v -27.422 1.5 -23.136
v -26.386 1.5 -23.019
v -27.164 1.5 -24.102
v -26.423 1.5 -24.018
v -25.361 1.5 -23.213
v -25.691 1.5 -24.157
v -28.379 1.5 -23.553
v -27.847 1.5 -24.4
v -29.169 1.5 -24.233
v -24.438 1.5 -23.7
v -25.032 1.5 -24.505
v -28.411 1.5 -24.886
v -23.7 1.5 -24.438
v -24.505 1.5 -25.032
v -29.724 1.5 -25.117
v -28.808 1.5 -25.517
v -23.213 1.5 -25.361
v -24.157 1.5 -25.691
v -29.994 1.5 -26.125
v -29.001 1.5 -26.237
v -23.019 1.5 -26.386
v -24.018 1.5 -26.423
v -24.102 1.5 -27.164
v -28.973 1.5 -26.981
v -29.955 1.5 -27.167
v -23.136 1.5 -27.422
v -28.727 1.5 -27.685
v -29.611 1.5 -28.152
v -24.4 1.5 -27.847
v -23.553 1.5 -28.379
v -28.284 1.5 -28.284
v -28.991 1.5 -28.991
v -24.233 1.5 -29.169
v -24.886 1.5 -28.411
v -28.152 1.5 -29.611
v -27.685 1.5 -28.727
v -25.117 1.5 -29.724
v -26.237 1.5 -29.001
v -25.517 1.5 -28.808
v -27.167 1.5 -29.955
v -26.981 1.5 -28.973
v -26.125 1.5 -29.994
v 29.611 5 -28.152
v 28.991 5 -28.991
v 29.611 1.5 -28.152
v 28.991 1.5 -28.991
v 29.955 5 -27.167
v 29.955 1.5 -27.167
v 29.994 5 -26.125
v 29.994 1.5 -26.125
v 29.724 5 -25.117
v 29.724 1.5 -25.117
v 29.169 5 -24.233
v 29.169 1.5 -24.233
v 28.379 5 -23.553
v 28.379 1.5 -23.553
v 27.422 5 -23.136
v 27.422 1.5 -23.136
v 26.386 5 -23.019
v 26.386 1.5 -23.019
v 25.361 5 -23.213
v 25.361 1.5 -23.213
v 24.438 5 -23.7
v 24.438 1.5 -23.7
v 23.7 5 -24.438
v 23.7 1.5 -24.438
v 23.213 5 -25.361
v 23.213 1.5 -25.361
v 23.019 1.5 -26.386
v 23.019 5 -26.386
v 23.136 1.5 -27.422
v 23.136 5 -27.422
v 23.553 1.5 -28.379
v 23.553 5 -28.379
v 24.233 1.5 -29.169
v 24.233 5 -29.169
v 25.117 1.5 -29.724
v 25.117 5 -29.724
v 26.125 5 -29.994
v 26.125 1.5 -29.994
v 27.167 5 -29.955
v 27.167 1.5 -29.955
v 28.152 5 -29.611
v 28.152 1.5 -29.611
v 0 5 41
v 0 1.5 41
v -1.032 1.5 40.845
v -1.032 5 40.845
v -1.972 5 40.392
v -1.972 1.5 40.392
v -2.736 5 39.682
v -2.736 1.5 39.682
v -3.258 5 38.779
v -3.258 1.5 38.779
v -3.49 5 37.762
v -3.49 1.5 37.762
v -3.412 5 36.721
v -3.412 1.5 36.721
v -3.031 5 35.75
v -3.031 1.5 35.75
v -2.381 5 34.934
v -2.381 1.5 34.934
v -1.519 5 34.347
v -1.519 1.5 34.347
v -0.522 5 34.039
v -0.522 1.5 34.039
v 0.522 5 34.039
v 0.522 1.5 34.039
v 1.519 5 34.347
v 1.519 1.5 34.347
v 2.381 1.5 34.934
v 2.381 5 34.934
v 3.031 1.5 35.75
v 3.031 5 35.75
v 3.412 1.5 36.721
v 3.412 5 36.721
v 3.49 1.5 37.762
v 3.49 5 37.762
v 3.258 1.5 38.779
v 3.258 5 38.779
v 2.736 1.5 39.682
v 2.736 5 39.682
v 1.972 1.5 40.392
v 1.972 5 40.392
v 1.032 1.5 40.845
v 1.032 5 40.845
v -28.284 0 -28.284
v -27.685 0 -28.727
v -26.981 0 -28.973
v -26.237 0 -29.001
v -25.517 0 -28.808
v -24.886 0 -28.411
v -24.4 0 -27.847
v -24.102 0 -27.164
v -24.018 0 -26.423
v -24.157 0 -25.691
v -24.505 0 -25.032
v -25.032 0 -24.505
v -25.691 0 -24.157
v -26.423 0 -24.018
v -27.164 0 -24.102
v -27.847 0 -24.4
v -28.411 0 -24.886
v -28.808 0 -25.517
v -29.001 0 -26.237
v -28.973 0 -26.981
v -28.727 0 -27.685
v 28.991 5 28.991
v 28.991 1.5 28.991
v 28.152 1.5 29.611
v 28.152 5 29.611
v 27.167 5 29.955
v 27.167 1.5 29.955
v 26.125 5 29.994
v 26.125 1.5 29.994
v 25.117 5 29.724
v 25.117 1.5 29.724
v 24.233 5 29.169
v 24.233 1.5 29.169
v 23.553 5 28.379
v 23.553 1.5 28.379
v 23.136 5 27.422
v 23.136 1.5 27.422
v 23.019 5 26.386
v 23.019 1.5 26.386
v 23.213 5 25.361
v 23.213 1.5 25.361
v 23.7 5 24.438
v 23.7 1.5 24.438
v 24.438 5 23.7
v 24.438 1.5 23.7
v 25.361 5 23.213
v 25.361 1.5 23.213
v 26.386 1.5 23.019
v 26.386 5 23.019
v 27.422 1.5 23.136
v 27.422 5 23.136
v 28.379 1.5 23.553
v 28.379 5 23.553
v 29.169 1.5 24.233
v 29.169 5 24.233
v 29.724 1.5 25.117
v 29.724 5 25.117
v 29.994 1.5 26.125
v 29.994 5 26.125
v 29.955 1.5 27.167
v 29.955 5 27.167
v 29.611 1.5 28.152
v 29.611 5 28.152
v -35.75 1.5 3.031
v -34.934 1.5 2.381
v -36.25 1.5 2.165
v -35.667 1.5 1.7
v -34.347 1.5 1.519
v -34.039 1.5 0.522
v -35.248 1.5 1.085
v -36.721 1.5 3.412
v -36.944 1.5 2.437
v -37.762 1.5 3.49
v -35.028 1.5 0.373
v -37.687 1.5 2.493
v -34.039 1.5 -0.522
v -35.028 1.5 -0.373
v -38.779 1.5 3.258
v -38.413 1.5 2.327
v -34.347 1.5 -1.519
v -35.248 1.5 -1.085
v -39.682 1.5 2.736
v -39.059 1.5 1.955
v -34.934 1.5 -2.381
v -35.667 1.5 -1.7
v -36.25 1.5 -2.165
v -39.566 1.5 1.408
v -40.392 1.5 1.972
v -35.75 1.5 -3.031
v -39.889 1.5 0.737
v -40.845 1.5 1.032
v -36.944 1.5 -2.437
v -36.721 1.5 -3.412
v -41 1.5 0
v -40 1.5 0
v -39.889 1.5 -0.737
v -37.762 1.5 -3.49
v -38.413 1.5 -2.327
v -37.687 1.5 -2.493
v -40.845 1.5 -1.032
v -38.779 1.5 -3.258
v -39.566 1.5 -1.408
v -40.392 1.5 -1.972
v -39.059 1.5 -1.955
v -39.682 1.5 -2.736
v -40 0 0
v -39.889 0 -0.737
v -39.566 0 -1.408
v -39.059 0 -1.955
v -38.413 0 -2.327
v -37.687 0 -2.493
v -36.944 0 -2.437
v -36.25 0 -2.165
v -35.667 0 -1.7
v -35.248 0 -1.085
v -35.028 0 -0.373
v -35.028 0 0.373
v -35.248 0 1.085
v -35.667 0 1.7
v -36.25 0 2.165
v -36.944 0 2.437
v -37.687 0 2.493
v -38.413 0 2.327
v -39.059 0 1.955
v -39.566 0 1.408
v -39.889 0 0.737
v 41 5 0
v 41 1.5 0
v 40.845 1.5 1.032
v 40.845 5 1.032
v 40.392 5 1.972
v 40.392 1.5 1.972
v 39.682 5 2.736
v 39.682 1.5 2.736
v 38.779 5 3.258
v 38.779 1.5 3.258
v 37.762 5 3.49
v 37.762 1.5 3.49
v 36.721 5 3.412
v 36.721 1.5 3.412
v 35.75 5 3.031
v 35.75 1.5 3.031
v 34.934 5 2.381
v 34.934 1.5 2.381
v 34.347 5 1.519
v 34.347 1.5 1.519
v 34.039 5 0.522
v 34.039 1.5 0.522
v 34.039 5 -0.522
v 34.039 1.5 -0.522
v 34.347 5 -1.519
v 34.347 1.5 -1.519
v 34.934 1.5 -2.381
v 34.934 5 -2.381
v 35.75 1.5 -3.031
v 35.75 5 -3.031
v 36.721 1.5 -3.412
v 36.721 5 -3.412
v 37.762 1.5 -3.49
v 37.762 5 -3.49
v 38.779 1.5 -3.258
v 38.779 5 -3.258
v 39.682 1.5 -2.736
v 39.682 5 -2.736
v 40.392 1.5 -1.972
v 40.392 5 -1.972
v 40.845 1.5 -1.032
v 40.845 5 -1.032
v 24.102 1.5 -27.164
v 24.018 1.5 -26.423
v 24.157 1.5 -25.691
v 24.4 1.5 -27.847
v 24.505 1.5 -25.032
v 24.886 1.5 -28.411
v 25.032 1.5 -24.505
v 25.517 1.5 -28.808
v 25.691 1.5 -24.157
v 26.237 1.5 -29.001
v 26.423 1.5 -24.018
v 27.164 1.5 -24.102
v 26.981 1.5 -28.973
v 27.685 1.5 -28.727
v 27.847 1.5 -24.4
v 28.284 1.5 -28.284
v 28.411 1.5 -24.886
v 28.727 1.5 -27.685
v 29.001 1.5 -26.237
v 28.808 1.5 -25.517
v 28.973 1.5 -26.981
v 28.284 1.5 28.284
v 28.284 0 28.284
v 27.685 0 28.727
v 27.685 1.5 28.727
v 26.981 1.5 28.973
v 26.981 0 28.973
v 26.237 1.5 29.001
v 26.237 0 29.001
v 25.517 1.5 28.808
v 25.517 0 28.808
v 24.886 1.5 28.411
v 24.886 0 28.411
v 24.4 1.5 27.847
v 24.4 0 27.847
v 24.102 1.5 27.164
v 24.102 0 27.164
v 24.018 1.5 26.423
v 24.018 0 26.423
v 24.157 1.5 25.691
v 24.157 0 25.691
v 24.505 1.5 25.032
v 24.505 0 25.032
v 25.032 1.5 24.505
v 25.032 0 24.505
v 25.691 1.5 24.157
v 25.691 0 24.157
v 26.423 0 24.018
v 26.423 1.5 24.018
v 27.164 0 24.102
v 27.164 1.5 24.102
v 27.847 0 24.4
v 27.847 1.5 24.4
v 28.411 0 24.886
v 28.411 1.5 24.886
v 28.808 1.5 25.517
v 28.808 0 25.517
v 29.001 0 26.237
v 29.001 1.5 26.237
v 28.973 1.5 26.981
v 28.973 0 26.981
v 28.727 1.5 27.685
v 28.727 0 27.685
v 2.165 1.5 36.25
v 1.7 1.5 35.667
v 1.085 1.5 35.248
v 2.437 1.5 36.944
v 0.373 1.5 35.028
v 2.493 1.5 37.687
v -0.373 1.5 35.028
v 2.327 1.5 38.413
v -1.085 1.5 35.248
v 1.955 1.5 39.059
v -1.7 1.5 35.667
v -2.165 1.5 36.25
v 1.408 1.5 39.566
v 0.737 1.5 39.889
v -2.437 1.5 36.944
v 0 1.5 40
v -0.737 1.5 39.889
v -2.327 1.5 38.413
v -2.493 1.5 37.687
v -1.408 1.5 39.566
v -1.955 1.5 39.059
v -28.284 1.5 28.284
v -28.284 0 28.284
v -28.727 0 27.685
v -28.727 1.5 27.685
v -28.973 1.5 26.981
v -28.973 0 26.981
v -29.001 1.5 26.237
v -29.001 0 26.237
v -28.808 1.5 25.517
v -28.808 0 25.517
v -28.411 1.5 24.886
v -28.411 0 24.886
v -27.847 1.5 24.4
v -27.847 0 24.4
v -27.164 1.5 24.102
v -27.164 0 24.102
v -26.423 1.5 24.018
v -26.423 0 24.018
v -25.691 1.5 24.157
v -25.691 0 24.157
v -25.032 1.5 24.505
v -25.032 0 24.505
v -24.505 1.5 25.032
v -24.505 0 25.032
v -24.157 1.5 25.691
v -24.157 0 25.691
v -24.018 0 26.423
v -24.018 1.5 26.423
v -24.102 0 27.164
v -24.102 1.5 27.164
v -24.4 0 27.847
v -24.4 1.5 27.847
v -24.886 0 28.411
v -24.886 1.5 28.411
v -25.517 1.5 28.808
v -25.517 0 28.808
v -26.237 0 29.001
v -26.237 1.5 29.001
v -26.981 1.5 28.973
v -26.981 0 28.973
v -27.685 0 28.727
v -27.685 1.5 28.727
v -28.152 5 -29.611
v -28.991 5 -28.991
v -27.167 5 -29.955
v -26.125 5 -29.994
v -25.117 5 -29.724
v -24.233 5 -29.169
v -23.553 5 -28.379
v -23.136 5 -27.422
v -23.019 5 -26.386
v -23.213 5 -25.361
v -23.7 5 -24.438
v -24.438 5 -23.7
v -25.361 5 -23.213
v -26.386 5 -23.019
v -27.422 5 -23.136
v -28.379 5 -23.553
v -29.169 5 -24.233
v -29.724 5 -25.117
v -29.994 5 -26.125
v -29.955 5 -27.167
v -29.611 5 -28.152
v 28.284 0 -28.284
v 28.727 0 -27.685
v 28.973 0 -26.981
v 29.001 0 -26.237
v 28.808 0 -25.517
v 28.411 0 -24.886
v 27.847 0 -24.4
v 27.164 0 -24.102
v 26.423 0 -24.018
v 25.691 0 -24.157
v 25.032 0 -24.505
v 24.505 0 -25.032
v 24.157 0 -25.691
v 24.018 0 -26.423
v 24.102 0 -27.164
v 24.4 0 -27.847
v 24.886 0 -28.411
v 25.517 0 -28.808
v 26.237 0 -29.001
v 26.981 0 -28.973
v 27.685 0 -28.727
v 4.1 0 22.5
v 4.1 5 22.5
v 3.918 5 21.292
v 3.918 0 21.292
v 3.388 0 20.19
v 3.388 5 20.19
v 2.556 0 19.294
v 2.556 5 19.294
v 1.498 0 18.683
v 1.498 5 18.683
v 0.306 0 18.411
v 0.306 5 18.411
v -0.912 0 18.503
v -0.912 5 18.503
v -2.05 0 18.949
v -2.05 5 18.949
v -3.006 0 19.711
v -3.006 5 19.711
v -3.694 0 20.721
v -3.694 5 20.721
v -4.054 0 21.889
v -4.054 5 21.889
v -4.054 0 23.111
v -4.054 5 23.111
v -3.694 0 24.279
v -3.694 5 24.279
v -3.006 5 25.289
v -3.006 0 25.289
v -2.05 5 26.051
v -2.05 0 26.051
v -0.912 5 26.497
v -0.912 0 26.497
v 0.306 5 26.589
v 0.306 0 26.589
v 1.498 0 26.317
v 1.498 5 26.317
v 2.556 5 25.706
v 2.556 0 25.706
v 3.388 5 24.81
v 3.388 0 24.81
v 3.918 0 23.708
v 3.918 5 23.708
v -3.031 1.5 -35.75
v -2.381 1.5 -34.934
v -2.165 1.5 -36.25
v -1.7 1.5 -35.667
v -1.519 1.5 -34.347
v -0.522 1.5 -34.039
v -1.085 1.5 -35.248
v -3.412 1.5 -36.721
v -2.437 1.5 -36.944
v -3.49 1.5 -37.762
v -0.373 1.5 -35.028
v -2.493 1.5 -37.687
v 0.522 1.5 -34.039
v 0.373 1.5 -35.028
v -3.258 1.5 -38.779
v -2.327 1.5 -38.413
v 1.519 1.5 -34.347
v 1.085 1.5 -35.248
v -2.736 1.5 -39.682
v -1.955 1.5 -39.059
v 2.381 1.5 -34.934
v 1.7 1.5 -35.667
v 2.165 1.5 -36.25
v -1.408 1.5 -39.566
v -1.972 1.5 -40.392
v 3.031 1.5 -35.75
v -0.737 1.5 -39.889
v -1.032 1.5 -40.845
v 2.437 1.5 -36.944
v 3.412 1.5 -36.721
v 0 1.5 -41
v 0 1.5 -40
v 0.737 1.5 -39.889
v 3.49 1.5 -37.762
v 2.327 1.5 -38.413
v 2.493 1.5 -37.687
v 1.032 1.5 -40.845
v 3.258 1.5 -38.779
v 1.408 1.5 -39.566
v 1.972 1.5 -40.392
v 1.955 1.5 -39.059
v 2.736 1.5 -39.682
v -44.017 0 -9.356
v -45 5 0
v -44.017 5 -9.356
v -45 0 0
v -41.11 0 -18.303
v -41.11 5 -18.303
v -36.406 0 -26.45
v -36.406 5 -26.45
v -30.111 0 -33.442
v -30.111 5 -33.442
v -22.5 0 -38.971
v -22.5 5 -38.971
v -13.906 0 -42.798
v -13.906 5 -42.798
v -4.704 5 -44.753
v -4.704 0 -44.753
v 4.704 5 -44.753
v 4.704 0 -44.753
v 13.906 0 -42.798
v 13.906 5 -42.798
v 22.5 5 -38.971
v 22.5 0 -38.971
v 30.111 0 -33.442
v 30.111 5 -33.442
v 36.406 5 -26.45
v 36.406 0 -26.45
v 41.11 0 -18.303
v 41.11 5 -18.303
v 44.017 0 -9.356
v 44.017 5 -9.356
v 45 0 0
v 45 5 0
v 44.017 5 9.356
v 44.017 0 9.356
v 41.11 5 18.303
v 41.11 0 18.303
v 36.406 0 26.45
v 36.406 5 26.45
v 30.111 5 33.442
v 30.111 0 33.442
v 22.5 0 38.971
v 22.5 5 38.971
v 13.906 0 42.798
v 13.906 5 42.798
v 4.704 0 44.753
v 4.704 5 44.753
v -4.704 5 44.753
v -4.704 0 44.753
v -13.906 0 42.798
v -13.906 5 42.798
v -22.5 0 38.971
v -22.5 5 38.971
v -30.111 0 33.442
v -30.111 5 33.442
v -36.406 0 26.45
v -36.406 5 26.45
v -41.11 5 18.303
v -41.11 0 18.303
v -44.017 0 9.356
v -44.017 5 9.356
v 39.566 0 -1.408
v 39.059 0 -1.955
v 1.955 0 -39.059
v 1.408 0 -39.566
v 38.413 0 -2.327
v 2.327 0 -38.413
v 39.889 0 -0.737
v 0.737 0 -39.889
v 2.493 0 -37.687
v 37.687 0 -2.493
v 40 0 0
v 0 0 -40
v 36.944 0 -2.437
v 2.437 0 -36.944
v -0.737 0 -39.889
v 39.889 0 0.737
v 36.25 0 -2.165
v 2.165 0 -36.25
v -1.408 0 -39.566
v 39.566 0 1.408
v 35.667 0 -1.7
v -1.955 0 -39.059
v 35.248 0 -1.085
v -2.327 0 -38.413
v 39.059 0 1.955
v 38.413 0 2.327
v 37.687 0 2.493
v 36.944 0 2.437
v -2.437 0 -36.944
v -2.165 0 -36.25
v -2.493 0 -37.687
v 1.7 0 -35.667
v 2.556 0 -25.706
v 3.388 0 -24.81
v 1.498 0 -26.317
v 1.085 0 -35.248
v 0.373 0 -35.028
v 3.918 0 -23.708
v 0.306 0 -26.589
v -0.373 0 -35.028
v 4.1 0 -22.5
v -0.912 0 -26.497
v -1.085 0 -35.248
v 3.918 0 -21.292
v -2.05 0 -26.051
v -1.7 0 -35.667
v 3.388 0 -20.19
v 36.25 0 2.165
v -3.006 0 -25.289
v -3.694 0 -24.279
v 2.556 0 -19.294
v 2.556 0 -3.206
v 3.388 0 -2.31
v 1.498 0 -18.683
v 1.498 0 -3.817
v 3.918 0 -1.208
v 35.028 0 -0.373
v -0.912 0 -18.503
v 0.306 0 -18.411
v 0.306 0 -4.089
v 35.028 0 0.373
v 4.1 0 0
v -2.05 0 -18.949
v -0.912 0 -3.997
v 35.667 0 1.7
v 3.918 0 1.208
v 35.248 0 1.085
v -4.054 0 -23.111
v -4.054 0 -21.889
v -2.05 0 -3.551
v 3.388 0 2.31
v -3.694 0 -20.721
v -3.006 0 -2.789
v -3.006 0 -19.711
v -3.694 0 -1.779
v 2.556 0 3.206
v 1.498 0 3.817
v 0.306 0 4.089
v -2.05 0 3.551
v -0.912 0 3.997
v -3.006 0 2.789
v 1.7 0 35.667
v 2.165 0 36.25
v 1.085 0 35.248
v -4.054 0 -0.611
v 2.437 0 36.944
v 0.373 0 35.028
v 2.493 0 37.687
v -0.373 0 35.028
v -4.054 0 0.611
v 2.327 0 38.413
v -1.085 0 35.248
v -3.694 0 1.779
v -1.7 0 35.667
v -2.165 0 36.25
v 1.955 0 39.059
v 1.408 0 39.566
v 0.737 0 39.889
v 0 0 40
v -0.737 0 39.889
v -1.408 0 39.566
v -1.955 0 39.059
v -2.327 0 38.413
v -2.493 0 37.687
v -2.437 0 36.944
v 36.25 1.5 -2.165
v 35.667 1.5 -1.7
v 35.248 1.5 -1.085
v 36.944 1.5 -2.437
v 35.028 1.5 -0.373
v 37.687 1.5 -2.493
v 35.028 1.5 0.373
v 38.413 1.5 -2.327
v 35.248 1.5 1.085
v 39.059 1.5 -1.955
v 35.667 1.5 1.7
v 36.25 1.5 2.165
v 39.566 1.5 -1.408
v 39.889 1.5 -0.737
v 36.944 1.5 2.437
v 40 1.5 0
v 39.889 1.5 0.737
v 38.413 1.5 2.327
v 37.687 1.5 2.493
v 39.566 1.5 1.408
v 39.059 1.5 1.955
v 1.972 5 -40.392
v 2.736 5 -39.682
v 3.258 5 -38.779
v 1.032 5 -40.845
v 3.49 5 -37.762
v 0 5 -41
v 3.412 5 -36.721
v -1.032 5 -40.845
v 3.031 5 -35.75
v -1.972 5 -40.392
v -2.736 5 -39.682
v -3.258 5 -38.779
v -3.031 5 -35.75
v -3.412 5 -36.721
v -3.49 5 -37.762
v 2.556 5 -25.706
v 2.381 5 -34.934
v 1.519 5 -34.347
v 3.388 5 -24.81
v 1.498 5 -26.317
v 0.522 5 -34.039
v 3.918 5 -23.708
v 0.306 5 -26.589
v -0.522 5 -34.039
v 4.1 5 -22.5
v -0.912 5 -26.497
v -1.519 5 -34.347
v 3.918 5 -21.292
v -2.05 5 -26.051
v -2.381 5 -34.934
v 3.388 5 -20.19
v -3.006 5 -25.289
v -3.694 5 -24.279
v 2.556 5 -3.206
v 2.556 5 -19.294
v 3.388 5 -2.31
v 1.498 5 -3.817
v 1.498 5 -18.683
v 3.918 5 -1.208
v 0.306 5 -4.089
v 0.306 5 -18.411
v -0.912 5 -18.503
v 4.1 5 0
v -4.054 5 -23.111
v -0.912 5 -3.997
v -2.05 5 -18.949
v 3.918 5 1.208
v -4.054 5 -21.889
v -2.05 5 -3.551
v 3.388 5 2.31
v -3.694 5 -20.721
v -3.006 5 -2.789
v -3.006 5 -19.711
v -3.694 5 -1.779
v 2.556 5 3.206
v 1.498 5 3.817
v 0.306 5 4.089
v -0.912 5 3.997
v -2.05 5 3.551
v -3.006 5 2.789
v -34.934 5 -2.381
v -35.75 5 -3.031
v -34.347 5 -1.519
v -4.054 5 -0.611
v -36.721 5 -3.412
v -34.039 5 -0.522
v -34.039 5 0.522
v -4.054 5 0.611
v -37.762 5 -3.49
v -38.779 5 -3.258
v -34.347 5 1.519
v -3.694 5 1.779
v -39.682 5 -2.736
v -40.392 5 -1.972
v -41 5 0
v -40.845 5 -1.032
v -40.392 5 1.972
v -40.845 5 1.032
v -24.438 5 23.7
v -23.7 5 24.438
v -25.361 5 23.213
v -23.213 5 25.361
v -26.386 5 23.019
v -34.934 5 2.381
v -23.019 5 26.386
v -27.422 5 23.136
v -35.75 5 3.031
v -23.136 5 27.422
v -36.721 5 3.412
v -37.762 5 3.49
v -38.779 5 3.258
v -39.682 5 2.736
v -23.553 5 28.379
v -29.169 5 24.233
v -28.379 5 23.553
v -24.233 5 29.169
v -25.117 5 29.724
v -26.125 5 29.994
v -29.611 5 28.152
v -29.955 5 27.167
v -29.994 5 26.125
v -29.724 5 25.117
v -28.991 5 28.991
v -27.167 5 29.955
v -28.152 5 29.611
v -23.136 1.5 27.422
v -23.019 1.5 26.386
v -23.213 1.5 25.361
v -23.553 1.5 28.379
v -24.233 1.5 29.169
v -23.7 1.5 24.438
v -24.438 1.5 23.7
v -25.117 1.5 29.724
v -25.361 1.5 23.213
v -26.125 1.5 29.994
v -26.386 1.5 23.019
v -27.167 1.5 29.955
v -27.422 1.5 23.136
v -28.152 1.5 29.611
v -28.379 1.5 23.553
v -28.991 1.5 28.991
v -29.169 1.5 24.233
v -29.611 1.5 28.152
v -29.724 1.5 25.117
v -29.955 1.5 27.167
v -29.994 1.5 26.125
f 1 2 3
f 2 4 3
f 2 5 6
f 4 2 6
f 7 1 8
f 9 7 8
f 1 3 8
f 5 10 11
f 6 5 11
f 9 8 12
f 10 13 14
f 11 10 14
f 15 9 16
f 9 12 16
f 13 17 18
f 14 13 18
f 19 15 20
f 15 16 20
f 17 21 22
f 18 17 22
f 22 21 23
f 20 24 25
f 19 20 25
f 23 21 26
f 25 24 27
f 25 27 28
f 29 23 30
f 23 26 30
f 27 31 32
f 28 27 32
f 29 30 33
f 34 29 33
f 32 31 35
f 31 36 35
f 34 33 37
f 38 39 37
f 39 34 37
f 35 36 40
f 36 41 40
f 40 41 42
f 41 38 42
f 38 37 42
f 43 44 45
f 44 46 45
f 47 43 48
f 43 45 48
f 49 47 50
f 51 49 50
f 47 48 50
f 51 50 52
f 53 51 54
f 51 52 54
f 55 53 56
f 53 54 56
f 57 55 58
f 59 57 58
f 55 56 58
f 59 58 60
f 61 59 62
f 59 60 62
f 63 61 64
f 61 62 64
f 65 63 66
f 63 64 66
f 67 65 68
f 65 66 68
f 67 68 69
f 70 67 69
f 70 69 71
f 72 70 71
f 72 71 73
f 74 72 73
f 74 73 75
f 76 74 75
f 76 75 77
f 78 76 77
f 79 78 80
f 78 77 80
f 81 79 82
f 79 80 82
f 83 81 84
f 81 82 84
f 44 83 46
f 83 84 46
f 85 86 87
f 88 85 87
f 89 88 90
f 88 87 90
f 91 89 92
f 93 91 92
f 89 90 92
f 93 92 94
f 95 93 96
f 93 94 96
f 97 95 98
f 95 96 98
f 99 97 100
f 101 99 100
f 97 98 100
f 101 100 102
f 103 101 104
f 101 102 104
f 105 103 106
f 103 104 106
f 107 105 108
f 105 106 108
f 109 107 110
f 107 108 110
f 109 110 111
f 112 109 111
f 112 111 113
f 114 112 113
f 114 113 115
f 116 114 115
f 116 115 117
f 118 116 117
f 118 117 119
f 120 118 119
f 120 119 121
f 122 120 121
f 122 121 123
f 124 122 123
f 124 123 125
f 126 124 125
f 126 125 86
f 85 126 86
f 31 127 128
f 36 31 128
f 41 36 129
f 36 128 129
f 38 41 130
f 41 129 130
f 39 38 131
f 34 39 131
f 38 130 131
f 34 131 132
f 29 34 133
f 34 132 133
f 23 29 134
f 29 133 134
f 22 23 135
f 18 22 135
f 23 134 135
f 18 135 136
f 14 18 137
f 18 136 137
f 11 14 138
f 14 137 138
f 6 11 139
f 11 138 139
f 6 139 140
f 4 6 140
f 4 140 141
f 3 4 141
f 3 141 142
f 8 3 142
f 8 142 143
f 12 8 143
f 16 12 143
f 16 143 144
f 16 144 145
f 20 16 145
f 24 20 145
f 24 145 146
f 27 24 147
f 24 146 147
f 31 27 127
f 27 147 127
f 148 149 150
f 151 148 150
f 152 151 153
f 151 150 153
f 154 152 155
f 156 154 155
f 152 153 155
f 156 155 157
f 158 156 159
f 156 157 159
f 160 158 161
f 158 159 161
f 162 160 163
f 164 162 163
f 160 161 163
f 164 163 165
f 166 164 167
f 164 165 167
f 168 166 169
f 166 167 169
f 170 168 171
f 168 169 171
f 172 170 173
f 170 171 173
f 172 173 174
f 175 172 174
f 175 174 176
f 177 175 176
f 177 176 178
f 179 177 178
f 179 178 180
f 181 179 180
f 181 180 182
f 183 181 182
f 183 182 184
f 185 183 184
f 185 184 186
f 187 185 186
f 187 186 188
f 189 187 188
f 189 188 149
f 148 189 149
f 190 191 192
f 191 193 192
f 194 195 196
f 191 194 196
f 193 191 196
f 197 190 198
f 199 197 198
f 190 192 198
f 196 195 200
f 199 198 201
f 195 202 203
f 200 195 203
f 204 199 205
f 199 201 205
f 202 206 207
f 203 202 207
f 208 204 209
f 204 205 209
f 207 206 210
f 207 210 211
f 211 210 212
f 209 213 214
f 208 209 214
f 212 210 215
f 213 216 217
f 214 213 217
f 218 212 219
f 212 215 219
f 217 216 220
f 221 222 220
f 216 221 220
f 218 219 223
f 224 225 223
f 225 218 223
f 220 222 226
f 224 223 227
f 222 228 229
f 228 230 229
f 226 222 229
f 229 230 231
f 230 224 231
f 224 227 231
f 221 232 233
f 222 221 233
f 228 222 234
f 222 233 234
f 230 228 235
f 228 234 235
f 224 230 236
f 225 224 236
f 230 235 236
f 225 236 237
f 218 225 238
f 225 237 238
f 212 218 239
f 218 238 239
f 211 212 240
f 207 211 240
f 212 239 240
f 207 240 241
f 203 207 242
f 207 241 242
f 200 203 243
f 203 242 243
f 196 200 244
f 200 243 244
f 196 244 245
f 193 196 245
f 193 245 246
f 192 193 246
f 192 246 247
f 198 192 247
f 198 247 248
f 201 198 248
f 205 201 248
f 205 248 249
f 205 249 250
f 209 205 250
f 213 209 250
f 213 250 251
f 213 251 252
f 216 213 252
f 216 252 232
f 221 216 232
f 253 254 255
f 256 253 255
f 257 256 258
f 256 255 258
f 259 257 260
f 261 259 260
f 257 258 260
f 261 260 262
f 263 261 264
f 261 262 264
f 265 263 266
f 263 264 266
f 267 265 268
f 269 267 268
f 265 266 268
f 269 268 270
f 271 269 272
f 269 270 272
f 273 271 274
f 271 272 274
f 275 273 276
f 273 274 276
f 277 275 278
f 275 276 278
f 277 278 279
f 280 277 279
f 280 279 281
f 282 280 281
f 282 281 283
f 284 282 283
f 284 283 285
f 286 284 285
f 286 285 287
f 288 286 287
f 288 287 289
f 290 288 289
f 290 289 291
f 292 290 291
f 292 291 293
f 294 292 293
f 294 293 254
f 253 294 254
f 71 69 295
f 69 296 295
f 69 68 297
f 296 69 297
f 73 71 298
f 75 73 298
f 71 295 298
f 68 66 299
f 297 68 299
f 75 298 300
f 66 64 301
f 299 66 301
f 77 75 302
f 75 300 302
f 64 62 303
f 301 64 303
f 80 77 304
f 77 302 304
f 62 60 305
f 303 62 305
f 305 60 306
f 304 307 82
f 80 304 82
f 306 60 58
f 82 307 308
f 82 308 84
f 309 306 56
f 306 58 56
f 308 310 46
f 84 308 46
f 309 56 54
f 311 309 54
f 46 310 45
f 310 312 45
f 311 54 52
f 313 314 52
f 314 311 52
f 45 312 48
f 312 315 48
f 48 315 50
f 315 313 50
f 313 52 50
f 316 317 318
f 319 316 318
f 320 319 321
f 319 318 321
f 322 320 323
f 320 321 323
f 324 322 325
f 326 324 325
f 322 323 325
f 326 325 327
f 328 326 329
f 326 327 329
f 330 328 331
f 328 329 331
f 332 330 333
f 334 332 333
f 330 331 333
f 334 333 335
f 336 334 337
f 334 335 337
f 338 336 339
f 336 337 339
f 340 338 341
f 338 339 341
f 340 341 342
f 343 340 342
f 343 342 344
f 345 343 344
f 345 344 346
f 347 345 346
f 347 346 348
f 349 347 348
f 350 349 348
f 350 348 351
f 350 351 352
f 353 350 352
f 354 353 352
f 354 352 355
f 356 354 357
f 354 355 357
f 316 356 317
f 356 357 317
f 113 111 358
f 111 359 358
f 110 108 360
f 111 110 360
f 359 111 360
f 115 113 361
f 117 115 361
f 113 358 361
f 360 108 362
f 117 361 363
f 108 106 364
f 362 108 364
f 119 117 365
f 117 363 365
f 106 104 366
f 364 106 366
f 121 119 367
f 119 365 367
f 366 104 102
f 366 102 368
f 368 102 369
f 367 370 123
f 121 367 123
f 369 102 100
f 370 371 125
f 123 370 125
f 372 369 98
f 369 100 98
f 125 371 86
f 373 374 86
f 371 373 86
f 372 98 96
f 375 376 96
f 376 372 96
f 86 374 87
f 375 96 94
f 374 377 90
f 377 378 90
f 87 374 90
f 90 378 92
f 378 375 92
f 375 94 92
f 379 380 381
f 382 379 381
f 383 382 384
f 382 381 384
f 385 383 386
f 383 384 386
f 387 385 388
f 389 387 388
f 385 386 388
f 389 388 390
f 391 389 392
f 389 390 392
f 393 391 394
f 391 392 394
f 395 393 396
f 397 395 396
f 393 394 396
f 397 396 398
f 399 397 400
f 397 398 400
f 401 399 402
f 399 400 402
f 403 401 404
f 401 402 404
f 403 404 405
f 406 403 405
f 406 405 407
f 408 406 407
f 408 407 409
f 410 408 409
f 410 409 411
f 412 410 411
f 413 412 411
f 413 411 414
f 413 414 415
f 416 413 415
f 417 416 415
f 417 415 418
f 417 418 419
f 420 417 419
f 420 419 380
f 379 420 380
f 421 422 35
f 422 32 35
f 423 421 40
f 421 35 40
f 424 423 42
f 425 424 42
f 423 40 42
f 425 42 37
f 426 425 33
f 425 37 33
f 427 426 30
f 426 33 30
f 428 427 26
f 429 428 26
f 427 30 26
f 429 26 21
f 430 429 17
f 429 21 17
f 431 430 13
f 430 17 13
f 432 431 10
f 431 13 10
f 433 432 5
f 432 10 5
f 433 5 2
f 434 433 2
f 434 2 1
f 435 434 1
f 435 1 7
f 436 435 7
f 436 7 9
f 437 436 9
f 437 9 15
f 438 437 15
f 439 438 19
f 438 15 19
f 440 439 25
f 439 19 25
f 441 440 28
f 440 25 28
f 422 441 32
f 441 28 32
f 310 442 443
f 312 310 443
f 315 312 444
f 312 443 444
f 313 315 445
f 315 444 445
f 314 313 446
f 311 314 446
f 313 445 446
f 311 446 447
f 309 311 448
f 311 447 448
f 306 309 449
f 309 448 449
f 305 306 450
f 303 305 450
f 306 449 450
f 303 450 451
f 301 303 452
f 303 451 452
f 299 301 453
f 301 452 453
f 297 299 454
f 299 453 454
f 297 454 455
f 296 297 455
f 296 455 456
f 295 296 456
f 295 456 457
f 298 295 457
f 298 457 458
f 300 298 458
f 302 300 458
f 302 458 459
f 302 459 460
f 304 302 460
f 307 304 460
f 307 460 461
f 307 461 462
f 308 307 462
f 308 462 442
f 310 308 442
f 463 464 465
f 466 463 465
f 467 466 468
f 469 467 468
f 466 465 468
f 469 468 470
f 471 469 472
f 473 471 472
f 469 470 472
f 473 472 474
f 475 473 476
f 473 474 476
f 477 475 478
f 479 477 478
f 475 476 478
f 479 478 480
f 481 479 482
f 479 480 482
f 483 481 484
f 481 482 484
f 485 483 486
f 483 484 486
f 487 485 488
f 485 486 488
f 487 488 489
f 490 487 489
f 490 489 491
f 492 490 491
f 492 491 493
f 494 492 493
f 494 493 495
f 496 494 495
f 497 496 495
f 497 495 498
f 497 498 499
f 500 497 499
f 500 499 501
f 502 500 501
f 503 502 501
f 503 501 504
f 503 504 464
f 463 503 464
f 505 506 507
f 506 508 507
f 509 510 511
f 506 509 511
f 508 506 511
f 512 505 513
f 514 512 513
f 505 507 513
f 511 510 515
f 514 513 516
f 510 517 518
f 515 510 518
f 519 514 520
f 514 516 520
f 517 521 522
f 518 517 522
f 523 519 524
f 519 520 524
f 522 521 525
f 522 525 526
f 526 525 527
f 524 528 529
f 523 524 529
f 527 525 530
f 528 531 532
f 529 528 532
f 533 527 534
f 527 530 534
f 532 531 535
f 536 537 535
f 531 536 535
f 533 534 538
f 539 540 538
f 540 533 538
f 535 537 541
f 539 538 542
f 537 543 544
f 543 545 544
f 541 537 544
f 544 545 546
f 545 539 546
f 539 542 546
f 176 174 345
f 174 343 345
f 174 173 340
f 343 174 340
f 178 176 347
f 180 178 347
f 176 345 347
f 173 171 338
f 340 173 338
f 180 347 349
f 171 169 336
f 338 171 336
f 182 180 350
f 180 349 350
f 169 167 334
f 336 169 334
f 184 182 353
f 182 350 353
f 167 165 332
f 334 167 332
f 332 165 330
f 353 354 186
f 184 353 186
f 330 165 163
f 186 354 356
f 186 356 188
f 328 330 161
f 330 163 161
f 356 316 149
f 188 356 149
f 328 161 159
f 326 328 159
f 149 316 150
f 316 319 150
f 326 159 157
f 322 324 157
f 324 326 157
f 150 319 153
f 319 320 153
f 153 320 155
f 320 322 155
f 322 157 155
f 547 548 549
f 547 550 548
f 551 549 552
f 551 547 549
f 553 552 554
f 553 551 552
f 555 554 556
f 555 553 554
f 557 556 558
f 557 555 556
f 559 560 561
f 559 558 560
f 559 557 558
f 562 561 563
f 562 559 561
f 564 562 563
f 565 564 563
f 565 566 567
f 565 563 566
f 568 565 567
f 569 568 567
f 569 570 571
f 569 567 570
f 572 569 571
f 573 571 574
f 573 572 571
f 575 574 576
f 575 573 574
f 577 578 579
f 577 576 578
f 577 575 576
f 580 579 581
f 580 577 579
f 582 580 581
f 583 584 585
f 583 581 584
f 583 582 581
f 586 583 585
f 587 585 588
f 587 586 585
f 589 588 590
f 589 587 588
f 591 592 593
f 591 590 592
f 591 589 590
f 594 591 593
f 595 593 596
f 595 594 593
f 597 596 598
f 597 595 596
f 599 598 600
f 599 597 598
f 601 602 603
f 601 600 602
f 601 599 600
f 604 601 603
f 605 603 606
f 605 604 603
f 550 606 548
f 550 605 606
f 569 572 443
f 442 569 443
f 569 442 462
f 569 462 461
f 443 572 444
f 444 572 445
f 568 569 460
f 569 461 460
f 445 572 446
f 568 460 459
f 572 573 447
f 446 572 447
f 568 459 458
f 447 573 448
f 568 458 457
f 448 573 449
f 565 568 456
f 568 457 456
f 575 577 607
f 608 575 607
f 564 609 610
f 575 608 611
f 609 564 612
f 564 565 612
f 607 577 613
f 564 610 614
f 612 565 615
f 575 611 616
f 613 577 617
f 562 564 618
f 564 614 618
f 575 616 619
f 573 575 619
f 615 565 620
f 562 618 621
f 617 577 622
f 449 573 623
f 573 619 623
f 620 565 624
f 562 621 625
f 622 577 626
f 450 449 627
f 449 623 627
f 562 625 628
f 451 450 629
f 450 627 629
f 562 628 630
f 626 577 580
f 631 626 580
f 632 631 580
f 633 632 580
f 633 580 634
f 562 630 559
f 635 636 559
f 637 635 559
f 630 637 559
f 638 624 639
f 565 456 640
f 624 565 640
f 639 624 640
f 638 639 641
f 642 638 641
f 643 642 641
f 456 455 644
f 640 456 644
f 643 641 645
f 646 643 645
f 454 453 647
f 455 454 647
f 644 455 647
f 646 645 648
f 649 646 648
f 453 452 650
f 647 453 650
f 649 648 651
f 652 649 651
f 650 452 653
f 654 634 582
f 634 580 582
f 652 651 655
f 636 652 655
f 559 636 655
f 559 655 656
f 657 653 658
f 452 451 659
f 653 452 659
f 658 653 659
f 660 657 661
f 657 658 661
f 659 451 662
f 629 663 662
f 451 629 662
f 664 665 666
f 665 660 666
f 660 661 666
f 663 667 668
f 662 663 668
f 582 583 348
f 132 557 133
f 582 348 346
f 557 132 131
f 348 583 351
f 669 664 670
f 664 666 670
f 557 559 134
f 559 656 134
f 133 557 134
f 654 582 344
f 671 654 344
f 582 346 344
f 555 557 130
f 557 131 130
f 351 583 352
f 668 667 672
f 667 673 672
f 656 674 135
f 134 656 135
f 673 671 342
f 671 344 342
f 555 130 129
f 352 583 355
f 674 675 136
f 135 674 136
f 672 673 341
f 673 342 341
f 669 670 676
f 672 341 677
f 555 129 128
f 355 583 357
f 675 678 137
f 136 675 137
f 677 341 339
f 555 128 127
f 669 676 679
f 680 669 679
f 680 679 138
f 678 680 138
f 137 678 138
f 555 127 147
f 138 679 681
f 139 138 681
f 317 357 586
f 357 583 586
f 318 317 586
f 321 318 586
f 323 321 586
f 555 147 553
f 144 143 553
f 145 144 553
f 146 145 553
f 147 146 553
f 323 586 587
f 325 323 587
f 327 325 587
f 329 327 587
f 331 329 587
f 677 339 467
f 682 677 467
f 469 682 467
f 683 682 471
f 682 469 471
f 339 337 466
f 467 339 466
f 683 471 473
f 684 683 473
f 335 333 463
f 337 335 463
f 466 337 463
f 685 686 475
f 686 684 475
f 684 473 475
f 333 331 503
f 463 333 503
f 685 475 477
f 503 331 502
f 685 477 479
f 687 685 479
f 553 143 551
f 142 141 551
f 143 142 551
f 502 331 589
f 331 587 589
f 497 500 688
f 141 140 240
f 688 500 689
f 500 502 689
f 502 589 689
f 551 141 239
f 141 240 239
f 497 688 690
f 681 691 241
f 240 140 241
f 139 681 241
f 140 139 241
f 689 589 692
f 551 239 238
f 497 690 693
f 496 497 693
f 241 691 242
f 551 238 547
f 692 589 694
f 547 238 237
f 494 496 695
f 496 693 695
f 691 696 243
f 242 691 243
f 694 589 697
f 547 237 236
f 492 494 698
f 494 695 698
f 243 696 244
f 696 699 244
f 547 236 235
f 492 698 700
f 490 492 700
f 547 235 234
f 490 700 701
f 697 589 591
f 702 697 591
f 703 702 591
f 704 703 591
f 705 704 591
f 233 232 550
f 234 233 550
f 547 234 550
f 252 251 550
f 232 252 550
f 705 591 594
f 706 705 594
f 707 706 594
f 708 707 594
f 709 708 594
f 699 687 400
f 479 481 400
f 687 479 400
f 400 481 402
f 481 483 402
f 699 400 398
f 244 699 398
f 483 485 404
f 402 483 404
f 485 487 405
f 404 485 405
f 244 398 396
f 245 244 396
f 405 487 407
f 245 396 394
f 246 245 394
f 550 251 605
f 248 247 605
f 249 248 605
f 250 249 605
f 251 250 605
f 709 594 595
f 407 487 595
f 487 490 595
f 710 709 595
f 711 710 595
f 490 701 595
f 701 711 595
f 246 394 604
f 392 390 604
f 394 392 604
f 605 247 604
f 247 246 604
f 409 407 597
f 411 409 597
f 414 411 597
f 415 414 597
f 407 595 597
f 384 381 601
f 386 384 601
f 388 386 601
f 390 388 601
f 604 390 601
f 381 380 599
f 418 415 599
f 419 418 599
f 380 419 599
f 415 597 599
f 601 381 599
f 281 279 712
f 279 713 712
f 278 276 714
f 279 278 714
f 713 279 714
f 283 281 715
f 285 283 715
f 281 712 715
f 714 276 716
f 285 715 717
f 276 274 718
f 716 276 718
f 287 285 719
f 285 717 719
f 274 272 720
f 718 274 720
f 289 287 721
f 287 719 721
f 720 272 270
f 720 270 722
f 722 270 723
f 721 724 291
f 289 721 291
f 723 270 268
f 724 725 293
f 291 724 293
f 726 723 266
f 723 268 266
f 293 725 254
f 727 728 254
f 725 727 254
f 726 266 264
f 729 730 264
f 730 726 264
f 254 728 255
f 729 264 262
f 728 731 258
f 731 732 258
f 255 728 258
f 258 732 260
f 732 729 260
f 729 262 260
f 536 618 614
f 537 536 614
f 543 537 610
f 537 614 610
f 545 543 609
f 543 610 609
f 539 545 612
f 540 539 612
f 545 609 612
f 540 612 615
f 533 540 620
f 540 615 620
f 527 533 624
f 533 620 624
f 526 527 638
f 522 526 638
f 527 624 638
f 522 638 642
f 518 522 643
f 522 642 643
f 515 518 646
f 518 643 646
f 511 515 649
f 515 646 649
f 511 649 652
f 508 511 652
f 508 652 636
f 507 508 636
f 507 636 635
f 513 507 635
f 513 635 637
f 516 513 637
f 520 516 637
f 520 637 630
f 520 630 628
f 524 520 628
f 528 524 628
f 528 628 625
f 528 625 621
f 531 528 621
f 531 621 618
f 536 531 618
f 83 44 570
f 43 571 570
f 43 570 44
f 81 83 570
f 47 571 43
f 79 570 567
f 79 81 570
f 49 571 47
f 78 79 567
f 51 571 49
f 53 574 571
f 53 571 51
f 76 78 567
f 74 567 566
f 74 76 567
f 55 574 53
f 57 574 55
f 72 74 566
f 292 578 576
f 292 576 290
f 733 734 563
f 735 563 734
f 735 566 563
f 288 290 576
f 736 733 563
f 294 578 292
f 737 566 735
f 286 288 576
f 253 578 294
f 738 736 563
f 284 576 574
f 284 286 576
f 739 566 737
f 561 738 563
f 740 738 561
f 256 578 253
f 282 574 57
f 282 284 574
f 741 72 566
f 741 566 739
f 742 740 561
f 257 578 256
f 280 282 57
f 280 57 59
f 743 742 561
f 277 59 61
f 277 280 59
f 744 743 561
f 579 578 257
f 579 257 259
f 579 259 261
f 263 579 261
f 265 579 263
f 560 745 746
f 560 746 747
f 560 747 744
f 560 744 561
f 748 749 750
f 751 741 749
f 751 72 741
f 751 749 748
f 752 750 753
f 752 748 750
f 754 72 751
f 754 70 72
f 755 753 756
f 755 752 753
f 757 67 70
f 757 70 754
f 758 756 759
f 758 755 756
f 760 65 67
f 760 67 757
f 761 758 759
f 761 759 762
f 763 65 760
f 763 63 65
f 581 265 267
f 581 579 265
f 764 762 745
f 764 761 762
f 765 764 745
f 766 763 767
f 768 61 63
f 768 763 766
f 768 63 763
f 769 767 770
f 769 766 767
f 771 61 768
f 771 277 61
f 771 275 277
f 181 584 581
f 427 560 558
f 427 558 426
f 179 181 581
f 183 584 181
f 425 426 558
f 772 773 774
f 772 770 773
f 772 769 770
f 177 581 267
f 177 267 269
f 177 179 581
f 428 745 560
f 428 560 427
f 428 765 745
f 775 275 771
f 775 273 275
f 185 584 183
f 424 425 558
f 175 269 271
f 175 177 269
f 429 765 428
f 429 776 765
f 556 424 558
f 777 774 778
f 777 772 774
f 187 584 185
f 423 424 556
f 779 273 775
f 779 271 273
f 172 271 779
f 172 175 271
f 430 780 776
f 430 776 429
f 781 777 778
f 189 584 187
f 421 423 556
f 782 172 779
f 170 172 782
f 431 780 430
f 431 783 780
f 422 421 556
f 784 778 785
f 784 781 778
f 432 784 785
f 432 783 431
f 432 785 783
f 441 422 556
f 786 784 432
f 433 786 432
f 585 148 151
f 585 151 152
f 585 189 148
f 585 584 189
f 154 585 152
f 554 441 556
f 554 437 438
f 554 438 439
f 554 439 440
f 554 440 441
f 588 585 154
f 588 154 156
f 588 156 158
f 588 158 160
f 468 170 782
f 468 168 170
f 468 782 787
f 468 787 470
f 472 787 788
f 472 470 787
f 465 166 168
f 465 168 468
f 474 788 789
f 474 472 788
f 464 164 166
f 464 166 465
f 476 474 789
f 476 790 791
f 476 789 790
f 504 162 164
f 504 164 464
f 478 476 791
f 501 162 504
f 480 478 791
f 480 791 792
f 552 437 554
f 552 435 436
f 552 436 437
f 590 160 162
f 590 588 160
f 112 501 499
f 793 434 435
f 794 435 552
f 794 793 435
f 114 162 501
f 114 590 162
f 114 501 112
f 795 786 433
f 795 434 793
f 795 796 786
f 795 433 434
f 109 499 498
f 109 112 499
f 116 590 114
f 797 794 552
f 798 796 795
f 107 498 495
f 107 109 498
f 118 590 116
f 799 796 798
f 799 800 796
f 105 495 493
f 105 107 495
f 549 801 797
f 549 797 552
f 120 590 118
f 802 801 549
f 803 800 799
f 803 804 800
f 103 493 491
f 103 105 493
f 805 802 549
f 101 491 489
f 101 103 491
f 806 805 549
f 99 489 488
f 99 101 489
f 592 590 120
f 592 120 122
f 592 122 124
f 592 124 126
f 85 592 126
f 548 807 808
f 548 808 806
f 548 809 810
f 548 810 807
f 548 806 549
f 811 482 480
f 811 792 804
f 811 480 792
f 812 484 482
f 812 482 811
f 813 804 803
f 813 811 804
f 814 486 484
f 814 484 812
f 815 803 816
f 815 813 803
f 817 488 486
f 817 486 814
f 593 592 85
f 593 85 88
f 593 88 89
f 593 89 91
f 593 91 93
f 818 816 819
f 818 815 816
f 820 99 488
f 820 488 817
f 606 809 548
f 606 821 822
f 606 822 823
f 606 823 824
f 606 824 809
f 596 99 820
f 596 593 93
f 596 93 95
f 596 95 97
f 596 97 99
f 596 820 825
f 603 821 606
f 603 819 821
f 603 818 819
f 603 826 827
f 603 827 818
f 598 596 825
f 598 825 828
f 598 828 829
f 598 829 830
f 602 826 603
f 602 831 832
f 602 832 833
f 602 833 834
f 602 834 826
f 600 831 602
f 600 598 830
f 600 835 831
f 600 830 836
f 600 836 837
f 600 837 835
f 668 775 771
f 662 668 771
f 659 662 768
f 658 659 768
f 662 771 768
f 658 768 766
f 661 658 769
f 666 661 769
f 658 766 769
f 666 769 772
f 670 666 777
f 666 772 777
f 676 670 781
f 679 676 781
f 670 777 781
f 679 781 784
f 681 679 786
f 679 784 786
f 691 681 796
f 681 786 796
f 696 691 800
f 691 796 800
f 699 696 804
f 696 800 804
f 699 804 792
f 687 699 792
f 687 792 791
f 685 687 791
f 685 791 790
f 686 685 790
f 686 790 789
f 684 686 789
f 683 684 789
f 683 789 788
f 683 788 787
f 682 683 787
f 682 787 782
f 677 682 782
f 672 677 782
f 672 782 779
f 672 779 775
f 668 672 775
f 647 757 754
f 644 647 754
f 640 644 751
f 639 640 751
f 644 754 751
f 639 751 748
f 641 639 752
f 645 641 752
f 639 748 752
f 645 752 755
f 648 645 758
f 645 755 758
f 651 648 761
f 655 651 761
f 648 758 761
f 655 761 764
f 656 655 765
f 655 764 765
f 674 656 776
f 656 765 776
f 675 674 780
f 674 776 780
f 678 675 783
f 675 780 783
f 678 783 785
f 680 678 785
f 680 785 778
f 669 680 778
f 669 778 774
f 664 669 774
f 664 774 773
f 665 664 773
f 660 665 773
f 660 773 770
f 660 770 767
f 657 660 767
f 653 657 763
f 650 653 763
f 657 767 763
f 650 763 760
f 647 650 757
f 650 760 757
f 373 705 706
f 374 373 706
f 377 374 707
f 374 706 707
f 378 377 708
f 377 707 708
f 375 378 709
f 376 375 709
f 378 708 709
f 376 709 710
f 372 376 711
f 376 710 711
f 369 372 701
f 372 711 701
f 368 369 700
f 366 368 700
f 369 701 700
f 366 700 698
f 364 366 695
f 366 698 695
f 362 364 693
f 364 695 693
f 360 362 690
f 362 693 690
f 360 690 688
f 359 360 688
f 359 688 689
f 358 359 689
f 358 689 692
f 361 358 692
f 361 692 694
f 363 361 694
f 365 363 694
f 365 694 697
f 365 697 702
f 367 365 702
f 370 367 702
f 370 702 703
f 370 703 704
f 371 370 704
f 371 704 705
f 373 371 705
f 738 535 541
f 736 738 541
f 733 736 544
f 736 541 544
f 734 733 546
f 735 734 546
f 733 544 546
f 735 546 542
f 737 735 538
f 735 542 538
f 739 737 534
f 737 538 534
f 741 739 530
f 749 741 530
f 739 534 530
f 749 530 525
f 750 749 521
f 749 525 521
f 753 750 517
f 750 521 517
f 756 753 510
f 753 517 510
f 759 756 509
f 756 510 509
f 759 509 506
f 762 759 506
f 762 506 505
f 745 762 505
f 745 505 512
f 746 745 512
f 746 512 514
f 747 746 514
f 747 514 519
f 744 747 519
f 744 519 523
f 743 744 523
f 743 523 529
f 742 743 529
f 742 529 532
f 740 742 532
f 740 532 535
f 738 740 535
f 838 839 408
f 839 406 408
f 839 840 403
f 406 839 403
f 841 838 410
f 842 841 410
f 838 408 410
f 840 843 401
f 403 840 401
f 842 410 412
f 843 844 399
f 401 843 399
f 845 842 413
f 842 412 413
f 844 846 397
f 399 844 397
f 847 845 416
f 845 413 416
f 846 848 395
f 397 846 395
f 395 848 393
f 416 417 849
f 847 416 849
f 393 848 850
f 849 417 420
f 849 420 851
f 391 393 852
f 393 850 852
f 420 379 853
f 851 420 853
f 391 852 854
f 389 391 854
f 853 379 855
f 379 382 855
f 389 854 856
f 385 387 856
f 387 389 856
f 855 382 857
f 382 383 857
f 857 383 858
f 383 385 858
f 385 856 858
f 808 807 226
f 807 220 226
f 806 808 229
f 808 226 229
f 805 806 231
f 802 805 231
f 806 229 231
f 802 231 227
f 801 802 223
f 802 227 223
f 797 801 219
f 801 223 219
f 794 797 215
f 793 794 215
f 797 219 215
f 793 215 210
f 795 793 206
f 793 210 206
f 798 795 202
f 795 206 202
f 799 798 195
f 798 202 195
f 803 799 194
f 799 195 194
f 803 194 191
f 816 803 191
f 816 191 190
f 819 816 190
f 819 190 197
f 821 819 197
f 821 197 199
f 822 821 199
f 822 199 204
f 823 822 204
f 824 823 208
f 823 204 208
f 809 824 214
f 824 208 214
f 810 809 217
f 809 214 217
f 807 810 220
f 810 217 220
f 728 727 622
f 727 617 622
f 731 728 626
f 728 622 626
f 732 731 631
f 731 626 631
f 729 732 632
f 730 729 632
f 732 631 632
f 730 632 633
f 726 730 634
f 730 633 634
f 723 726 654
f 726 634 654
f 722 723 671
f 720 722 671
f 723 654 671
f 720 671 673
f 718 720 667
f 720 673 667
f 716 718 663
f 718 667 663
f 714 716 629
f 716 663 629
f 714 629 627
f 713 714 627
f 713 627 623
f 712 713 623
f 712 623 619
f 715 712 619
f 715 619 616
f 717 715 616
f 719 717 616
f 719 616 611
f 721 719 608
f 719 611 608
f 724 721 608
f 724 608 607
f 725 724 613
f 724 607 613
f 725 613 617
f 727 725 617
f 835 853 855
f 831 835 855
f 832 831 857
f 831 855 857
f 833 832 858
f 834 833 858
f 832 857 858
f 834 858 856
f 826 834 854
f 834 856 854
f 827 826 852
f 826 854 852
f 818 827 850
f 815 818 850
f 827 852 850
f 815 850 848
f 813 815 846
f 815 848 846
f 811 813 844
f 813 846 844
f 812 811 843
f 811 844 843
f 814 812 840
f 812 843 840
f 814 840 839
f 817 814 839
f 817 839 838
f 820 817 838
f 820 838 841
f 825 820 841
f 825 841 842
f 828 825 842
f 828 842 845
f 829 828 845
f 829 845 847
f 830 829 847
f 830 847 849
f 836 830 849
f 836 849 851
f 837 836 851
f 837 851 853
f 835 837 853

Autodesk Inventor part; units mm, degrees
ref_plane "YZ Plane" through (0, 0, 0) normal (1, 0, 0) x (0, 1, 0)
ref_plane "XZ Plane" through (0, 0, 0) normal (0, 1, 0) x (-1, 0, 0)
ref_plane "XY Plane" through (0, 0, 0) normal (0, 0, 1) x (1, 0, 0)
sketch "Sketch1" plane through (0, 0, 0) normal (0, 1, 0) x (-1, 0, 0)
  circle A0 centre (0, 0) radius 45
  dimension "d0" = 90
extrude "Extrusion1" add sketch "Sketch1" along normal blind 5
sketch "Sketch2" plane through (0, 5, 0) normal (0, 1, 0) x (1, 0, 0)
  point P0 (0, 0)
  point P1 (0, -37.5)
  dimension "d17" = 37.5
sketch "Sketch3" plane through (0, 5, 0) normal (0, 1, 0) x (1, 0, 0)
  circle A0 centre (0, -22.5) radius 4.1
  circle A1 centre (0, 22.5) radius 4.1
  line L0 (-27.2764, 0) -> (27.2764, 0) construction
  circle A2 centre (0, 0) radius 4.1
  dimension "d12" = 8.2
  dimension "d14" = 45
extrude "Extrusion3" cut sketch "Sketch3" against normal up to surface (5 mm away)
hole "Hole1" at (0, 5, 37.5) direction (0, -1, 0) diameter 5 end through all counterbore diameter 7 counterbore depth 3.5
pattern_circular "Circular Pattern2" count 8 over 360 about axis through (0, 0, 0) along (0, 1, 0) of "Hole1"
